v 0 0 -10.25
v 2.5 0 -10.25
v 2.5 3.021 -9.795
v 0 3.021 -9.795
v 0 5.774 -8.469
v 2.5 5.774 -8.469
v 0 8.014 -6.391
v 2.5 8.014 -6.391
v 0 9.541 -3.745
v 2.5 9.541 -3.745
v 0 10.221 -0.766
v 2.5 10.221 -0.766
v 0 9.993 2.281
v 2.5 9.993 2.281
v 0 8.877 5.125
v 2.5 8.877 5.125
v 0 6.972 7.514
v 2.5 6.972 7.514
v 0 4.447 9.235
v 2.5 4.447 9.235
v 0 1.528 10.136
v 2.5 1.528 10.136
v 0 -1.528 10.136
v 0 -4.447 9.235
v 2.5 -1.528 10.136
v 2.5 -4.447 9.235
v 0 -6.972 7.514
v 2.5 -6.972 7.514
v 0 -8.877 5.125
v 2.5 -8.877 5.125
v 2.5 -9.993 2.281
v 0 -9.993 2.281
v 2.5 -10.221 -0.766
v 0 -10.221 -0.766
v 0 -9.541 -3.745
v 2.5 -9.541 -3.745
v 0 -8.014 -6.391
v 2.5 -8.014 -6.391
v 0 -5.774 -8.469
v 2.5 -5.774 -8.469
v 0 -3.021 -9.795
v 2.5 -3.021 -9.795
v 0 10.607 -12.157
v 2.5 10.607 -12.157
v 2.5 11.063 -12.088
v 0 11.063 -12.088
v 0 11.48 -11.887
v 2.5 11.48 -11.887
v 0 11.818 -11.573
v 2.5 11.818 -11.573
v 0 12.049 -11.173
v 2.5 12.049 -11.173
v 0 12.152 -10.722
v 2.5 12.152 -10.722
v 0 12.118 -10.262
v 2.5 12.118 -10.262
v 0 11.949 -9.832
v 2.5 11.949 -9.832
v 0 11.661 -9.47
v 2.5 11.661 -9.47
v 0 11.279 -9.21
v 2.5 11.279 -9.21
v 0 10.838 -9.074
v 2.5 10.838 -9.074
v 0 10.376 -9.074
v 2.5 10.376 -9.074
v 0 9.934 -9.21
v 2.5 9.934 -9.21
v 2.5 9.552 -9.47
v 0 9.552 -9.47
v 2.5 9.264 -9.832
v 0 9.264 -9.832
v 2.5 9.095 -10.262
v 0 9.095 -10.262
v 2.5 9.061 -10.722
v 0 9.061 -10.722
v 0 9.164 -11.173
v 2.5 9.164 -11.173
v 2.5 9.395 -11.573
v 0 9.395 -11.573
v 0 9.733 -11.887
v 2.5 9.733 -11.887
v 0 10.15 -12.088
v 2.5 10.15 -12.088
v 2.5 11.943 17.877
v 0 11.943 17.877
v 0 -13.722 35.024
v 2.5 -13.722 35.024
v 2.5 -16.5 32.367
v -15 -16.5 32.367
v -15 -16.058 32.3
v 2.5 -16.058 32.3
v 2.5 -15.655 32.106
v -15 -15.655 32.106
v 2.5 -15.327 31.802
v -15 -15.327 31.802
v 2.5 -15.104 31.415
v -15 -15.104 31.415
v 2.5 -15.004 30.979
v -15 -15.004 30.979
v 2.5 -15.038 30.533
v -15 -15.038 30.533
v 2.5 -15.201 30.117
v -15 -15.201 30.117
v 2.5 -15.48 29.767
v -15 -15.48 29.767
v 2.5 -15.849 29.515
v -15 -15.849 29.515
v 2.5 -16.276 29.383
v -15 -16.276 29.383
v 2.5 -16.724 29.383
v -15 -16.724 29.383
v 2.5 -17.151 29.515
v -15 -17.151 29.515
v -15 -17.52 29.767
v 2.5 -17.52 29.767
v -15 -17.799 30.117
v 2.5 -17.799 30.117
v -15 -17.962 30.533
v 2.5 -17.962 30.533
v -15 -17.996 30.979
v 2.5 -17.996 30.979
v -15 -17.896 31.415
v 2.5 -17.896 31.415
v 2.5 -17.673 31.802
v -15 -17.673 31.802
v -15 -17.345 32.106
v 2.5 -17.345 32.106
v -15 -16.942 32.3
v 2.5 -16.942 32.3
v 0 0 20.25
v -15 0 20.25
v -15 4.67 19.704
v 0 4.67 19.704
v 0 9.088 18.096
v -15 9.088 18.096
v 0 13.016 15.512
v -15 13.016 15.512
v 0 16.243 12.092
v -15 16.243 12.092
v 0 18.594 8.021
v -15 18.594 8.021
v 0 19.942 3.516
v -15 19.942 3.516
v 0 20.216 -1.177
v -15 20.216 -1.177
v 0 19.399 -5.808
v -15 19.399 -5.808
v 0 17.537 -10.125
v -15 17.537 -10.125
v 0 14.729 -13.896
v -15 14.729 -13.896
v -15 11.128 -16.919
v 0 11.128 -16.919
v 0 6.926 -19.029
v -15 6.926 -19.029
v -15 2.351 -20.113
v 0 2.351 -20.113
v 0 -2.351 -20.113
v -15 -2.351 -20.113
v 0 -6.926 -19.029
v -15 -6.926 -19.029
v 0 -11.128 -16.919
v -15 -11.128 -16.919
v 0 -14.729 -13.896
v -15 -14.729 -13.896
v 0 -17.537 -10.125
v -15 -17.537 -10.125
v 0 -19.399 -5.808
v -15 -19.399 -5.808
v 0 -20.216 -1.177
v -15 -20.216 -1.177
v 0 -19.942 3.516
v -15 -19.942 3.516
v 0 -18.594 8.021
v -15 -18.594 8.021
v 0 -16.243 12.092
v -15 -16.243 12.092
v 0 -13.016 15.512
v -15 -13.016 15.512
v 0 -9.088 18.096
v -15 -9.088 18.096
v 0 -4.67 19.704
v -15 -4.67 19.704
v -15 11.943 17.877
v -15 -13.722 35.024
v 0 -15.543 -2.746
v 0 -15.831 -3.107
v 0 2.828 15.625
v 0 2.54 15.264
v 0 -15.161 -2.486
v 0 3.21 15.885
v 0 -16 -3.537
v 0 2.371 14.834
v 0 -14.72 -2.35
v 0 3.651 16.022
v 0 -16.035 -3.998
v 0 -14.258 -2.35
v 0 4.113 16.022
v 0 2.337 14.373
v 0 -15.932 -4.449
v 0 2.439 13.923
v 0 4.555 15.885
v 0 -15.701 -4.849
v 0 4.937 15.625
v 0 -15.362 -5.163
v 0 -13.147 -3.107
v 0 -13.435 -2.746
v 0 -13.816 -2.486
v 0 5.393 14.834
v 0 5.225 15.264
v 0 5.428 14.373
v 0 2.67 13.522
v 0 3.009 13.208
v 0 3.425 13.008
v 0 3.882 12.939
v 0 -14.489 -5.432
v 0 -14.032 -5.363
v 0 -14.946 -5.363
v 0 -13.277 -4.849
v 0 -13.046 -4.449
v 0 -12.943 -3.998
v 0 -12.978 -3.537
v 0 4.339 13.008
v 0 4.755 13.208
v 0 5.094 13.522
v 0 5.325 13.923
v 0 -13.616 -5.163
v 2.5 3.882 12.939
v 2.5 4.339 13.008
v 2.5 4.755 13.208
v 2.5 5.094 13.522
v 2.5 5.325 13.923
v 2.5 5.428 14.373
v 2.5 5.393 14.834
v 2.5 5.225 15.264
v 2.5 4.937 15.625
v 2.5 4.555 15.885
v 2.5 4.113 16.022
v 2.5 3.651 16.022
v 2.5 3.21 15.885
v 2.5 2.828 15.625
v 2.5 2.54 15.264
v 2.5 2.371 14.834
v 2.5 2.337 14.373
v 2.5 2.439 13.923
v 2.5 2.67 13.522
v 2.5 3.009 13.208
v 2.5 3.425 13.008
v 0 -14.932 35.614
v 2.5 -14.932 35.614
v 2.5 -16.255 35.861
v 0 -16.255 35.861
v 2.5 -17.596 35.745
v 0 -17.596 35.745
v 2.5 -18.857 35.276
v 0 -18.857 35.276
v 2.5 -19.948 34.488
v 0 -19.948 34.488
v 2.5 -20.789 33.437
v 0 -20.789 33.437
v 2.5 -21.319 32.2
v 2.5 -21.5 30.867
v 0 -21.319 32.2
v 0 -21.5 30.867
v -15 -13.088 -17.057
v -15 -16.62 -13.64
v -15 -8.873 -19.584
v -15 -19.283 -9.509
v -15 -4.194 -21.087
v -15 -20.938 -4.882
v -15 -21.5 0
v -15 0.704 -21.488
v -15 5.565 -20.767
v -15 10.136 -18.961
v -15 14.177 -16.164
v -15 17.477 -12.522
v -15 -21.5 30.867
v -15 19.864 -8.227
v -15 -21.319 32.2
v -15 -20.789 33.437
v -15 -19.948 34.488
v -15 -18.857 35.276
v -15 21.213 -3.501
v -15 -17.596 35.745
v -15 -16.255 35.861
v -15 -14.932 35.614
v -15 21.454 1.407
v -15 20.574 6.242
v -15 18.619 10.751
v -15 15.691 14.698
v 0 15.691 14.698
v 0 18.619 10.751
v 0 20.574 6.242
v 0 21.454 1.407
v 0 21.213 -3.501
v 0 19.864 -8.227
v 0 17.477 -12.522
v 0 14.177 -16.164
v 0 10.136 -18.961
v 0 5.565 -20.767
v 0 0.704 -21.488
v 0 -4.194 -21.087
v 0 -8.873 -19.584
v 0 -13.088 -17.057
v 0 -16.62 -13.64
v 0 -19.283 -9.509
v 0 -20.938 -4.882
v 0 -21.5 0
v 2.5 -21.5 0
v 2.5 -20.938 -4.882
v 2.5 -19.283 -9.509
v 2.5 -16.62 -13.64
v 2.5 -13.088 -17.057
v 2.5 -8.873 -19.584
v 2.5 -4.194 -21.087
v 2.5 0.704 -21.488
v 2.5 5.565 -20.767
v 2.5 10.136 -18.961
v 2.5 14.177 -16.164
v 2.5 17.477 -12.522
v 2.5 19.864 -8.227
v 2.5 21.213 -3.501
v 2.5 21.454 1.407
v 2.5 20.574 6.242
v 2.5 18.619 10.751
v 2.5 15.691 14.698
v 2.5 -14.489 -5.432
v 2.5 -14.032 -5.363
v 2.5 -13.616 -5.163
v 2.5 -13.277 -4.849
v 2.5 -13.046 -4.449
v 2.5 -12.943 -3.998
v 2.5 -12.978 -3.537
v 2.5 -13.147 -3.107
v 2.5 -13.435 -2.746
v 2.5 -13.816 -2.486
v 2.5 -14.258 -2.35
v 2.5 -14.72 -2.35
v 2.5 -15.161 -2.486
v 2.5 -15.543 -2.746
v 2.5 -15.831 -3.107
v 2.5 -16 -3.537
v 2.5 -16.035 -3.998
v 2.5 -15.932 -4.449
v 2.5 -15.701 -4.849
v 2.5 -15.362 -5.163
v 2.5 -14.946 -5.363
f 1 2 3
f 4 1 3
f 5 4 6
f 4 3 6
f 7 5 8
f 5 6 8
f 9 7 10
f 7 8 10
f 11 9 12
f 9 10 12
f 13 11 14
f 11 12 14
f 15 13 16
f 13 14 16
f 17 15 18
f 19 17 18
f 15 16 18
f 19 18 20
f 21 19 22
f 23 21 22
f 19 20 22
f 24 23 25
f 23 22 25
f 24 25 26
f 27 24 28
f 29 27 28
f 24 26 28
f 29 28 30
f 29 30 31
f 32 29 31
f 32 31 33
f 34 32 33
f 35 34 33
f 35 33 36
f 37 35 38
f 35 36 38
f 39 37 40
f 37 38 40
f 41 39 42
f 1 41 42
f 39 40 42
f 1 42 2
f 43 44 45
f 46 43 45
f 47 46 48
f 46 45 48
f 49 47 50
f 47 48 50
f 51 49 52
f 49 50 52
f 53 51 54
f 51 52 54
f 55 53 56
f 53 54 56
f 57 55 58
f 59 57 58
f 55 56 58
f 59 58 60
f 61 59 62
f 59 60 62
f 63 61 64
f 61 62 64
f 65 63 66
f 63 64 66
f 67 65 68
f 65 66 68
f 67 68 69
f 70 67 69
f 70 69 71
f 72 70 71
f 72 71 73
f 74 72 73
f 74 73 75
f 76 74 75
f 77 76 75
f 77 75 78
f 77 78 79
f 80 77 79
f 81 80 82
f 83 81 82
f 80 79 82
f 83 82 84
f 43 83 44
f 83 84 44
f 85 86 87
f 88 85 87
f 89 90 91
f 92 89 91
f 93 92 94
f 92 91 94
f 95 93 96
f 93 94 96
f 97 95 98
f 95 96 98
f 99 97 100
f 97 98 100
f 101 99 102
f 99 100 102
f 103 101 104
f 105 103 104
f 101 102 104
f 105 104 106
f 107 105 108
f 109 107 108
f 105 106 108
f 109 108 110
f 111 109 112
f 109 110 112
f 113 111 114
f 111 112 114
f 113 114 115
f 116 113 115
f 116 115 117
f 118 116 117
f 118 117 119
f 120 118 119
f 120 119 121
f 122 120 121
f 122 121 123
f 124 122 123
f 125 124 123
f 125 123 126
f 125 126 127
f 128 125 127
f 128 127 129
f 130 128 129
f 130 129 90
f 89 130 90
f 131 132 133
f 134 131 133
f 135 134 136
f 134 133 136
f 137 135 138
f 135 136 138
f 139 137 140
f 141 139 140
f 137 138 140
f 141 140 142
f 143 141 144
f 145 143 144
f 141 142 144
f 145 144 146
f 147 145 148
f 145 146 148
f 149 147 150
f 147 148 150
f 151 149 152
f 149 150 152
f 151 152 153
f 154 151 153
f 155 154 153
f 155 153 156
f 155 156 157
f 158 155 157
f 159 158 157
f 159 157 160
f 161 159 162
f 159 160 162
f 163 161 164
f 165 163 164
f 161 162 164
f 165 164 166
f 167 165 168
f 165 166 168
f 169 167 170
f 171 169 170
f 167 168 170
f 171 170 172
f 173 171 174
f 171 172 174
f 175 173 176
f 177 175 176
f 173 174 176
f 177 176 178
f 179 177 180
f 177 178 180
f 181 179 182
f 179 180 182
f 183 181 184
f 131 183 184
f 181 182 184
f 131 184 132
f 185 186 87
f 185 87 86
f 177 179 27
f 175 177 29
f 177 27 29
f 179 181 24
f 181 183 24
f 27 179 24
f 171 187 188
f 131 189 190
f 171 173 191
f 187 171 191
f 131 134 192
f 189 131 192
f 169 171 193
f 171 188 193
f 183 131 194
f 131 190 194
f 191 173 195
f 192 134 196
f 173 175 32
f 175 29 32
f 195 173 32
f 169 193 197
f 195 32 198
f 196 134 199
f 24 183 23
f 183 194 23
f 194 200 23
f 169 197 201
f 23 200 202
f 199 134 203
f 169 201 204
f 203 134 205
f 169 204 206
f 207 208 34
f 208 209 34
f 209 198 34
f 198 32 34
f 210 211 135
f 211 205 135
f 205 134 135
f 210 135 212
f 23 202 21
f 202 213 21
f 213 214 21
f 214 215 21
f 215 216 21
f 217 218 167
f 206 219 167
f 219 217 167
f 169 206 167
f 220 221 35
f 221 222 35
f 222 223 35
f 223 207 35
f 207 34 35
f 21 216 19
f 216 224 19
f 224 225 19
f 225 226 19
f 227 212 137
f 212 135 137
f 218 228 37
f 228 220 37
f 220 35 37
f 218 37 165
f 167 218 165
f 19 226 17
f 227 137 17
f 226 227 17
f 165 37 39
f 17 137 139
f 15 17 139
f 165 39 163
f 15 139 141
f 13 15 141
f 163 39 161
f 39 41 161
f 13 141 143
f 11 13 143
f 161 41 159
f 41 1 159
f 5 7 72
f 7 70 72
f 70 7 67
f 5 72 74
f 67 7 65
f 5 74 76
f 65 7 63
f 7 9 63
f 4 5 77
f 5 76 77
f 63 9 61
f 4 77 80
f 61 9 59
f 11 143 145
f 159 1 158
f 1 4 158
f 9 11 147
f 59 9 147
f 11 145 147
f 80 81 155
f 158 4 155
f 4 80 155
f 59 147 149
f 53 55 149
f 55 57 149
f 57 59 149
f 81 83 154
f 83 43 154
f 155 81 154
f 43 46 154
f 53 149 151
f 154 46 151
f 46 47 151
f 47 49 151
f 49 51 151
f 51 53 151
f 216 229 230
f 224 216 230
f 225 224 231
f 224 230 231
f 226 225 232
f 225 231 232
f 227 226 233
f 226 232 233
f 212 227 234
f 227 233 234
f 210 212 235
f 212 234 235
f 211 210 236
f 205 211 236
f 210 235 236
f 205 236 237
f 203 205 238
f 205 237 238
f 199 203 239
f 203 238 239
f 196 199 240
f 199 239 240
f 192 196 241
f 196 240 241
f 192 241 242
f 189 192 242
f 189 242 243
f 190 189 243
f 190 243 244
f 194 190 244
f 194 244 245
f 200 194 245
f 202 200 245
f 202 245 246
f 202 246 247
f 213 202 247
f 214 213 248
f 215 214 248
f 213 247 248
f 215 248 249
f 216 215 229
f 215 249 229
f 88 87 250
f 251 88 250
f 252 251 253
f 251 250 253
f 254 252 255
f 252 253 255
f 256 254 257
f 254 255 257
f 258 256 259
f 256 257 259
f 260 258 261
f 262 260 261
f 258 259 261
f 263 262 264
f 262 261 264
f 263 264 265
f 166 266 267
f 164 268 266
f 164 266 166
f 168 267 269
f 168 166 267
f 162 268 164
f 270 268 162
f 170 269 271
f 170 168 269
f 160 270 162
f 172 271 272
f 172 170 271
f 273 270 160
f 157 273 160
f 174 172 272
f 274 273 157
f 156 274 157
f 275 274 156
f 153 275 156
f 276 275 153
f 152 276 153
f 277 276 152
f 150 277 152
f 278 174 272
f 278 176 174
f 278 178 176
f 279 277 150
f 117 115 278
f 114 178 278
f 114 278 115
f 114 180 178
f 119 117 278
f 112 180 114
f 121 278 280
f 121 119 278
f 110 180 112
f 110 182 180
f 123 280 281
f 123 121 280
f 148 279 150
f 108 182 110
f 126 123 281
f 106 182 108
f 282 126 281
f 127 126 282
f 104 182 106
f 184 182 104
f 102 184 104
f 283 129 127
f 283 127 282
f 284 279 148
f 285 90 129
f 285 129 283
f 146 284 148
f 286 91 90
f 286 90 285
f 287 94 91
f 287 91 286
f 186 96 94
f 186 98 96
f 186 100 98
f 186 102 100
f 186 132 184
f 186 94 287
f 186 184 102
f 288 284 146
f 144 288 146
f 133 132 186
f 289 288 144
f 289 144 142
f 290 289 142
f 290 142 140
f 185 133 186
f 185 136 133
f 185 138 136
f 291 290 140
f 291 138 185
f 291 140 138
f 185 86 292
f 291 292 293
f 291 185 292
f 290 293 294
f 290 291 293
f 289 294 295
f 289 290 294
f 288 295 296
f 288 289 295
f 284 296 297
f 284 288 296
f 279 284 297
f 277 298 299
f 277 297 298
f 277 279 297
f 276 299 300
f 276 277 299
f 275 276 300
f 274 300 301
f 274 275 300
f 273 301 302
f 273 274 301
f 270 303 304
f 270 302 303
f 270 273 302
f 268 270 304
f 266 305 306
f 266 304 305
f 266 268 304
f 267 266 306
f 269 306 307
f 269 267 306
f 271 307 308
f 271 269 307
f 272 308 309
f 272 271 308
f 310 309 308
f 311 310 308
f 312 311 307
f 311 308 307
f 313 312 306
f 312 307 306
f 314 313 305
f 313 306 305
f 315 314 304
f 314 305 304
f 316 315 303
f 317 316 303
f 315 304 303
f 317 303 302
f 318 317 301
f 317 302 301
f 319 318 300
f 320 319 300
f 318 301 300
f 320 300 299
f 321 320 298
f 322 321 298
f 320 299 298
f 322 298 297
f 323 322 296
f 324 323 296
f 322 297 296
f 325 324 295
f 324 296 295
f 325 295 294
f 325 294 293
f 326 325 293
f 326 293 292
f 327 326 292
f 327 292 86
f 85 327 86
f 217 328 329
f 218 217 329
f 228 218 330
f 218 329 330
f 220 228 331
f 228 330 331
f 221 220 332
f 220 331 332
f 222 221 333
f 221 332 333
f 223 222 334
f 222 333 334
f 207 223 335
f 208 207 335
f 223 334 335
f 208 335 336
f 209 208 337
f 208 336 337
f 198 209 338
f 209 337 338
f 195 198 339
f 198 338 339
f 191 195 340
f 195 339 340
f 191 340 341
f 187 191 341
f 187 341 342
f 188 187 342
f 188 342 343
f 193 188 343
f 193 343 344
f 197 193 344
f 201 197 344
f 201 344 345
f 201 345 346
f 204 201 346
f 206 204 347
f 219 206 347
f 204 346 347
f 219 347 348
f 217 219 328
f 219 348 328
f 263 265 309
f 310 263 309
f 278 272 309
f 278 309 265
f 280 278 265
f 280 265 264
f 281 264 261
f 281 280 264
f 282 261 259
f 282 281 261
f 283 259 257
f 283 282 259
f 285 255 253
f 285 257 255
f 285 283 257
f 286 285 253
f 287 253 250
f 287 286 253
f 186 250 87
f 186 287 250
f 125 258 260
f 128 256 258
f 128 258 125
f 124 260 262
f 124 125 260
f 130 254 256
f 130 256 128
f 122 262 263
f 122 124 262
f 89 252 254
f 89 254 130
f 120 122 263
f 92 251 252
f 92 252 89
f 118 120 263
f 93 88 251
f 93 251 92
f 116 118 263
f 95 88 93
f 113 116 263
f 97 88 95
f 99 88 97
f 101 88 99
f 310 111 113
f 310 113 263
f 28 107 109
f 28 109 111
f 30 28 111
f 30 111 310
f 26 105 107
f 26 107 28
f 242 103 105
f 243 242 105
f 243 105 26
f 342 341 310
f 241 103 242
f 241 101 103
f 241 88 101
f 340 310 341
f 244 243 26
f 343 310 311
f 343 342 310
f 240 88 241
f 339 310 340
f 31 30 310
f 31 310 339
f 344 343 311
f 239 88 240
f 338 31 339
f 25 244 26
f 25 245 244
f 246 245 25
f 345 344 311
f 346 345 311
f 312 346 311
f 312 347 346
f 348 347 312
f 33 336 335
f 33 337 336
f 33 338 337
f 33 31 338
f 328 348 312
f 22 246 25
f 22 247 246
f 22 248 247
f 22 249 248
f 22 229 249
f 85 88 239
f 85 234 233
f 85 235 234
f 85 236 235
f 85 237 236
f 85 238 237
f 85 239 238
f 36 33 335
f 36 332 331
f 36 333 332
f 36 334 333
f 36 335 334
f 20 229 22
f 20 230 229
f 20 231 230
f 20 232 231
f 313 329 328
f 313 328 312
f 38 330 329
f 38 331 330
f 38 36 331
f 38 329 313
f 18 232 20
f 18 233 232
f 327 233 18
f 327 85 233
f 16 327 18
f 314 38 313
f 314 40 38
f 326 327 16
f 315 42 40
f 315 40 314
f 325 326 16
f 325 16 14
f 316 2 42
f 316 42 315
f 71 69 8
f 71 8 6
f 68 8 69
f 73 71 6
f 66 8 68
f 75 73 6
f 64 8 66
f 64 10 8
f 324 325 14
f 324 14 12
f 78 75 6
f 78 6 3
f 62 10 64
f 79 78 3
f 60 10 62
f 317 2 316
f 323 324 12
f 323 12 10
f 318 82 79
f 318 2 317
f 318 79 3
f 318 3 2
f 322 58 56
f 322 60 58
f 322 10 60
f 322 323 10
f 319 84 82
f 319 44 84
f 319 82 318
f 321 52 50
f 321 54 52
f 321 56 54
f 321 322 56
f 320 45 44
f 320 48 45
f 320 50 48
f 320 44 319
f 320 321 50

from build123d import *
from build123d.topology import SkipClean

# Parameters (mm, degrees)
EXTRUDE_1_DEPTH     = 2.5
EXTRUDE_START       = 15
SKETCH_2_R          = 20.25
EXTRUDE_2_DEPTH     = 15
SKETCH_3_R          = 1.55
SKETCH_3_R_2        = 10.25
CUT_EXTRUDE_1_DEPTH = 2.5
SKETCH_5_R          = 1.5
CUT_EXTRUDE_2_DEPTH = 46.33118669


with BuildPart() as part:
    # Эскиз1 → Бобышка-Вытянуть1 (new body)
    with BuildSketch(Plane(origin=(0, 0, 0), x_dir=(0, 0, -1), z_dir=(1, 0, 0))):
        with BuildLine():
            Line((-30.866648668, -21.5), (0, -21.5))
            ThreePointArc((0, -21.5), (18.960941325, 10.135714286), (-17.877458963, 11.943469388))
            Line((-17.877458963, 11.943469388), (-35.024197264, -13.72244898))
            ThreePointArc((-35.024197264, -13.72244898), (-35.276169906, -18.857142857), (-30.866648668, -21.5))
        make_face()
    extrude(amount=EXTRUDE_1_DEPTH)

    # Эскиз2 → Бобышка-Вытянуть2 (add)
    with SkipClean():  # the faces are left unmerged after this step: merging them gives an invalid solid
        with BuildSketch(Plane.ZY.offset(EXTRUDE_START)):
            with BuildLine():
                Line((0, -21.5), (30.866648668, -21.5))
                ThreePointArc((30.866648668, -21.5), (35.276169906, -18.857142857), (35.024197264, -13.72244898))
                Line((35.024197264, -13.72244898), (17.877458963, 11.943469388))
                ThreePointArc((17.877458963, 11.943469388), (-18.960941325, 10.135714286), (0, -21.5))
            make_face()
            Circle(SKETCH_2_R, mode=Mode.SUBTRACT)
        extrude(amount=-EXTRUDE_2_DEPTH)

    # Эскиз3 → Вырез-Вытянуть1 (cut)
    with SkipClean():  # the faces are left unmerged after this step: merging them gives an invalid solid
        with BuildSketch(Plane(origin=(2.5, 0, 0), x_dir=(0, 0, -1), z_dir=(1, 0, 0))):
            with Locations((10.606601718, 10.606601718)):
                Circle(SKETCH_3_R)
            with Locations((3.882285677, -14.488887394)):
                Circle(SKETCH_3_R)
            with Locations((-14.488887394, 3.882285677)):
                Circle(SKETCH_3_R)
            Circle(SKETCH_3_R_2)
        extrude(amount=-CUT_EXTRUDE_1_DEPTH, mode=Mode.SUBTRACT)

    # Эскиз5 → Вырез-Вытянуть2 (cut, through all)
    with SkipClean():  # the faces are left unmerged after this step: merging them gives an invalid solid
        with BuildSketch(Plane.ZY.offset(15)):
            with Locations((30.866648668, -16.5)):
                Circle(SKETCH_5_R)
        extrude(amount=-CUT_EXTRUDE_2_DEPTH, mode=Mode.SUBTRACT)


solid = part.part
